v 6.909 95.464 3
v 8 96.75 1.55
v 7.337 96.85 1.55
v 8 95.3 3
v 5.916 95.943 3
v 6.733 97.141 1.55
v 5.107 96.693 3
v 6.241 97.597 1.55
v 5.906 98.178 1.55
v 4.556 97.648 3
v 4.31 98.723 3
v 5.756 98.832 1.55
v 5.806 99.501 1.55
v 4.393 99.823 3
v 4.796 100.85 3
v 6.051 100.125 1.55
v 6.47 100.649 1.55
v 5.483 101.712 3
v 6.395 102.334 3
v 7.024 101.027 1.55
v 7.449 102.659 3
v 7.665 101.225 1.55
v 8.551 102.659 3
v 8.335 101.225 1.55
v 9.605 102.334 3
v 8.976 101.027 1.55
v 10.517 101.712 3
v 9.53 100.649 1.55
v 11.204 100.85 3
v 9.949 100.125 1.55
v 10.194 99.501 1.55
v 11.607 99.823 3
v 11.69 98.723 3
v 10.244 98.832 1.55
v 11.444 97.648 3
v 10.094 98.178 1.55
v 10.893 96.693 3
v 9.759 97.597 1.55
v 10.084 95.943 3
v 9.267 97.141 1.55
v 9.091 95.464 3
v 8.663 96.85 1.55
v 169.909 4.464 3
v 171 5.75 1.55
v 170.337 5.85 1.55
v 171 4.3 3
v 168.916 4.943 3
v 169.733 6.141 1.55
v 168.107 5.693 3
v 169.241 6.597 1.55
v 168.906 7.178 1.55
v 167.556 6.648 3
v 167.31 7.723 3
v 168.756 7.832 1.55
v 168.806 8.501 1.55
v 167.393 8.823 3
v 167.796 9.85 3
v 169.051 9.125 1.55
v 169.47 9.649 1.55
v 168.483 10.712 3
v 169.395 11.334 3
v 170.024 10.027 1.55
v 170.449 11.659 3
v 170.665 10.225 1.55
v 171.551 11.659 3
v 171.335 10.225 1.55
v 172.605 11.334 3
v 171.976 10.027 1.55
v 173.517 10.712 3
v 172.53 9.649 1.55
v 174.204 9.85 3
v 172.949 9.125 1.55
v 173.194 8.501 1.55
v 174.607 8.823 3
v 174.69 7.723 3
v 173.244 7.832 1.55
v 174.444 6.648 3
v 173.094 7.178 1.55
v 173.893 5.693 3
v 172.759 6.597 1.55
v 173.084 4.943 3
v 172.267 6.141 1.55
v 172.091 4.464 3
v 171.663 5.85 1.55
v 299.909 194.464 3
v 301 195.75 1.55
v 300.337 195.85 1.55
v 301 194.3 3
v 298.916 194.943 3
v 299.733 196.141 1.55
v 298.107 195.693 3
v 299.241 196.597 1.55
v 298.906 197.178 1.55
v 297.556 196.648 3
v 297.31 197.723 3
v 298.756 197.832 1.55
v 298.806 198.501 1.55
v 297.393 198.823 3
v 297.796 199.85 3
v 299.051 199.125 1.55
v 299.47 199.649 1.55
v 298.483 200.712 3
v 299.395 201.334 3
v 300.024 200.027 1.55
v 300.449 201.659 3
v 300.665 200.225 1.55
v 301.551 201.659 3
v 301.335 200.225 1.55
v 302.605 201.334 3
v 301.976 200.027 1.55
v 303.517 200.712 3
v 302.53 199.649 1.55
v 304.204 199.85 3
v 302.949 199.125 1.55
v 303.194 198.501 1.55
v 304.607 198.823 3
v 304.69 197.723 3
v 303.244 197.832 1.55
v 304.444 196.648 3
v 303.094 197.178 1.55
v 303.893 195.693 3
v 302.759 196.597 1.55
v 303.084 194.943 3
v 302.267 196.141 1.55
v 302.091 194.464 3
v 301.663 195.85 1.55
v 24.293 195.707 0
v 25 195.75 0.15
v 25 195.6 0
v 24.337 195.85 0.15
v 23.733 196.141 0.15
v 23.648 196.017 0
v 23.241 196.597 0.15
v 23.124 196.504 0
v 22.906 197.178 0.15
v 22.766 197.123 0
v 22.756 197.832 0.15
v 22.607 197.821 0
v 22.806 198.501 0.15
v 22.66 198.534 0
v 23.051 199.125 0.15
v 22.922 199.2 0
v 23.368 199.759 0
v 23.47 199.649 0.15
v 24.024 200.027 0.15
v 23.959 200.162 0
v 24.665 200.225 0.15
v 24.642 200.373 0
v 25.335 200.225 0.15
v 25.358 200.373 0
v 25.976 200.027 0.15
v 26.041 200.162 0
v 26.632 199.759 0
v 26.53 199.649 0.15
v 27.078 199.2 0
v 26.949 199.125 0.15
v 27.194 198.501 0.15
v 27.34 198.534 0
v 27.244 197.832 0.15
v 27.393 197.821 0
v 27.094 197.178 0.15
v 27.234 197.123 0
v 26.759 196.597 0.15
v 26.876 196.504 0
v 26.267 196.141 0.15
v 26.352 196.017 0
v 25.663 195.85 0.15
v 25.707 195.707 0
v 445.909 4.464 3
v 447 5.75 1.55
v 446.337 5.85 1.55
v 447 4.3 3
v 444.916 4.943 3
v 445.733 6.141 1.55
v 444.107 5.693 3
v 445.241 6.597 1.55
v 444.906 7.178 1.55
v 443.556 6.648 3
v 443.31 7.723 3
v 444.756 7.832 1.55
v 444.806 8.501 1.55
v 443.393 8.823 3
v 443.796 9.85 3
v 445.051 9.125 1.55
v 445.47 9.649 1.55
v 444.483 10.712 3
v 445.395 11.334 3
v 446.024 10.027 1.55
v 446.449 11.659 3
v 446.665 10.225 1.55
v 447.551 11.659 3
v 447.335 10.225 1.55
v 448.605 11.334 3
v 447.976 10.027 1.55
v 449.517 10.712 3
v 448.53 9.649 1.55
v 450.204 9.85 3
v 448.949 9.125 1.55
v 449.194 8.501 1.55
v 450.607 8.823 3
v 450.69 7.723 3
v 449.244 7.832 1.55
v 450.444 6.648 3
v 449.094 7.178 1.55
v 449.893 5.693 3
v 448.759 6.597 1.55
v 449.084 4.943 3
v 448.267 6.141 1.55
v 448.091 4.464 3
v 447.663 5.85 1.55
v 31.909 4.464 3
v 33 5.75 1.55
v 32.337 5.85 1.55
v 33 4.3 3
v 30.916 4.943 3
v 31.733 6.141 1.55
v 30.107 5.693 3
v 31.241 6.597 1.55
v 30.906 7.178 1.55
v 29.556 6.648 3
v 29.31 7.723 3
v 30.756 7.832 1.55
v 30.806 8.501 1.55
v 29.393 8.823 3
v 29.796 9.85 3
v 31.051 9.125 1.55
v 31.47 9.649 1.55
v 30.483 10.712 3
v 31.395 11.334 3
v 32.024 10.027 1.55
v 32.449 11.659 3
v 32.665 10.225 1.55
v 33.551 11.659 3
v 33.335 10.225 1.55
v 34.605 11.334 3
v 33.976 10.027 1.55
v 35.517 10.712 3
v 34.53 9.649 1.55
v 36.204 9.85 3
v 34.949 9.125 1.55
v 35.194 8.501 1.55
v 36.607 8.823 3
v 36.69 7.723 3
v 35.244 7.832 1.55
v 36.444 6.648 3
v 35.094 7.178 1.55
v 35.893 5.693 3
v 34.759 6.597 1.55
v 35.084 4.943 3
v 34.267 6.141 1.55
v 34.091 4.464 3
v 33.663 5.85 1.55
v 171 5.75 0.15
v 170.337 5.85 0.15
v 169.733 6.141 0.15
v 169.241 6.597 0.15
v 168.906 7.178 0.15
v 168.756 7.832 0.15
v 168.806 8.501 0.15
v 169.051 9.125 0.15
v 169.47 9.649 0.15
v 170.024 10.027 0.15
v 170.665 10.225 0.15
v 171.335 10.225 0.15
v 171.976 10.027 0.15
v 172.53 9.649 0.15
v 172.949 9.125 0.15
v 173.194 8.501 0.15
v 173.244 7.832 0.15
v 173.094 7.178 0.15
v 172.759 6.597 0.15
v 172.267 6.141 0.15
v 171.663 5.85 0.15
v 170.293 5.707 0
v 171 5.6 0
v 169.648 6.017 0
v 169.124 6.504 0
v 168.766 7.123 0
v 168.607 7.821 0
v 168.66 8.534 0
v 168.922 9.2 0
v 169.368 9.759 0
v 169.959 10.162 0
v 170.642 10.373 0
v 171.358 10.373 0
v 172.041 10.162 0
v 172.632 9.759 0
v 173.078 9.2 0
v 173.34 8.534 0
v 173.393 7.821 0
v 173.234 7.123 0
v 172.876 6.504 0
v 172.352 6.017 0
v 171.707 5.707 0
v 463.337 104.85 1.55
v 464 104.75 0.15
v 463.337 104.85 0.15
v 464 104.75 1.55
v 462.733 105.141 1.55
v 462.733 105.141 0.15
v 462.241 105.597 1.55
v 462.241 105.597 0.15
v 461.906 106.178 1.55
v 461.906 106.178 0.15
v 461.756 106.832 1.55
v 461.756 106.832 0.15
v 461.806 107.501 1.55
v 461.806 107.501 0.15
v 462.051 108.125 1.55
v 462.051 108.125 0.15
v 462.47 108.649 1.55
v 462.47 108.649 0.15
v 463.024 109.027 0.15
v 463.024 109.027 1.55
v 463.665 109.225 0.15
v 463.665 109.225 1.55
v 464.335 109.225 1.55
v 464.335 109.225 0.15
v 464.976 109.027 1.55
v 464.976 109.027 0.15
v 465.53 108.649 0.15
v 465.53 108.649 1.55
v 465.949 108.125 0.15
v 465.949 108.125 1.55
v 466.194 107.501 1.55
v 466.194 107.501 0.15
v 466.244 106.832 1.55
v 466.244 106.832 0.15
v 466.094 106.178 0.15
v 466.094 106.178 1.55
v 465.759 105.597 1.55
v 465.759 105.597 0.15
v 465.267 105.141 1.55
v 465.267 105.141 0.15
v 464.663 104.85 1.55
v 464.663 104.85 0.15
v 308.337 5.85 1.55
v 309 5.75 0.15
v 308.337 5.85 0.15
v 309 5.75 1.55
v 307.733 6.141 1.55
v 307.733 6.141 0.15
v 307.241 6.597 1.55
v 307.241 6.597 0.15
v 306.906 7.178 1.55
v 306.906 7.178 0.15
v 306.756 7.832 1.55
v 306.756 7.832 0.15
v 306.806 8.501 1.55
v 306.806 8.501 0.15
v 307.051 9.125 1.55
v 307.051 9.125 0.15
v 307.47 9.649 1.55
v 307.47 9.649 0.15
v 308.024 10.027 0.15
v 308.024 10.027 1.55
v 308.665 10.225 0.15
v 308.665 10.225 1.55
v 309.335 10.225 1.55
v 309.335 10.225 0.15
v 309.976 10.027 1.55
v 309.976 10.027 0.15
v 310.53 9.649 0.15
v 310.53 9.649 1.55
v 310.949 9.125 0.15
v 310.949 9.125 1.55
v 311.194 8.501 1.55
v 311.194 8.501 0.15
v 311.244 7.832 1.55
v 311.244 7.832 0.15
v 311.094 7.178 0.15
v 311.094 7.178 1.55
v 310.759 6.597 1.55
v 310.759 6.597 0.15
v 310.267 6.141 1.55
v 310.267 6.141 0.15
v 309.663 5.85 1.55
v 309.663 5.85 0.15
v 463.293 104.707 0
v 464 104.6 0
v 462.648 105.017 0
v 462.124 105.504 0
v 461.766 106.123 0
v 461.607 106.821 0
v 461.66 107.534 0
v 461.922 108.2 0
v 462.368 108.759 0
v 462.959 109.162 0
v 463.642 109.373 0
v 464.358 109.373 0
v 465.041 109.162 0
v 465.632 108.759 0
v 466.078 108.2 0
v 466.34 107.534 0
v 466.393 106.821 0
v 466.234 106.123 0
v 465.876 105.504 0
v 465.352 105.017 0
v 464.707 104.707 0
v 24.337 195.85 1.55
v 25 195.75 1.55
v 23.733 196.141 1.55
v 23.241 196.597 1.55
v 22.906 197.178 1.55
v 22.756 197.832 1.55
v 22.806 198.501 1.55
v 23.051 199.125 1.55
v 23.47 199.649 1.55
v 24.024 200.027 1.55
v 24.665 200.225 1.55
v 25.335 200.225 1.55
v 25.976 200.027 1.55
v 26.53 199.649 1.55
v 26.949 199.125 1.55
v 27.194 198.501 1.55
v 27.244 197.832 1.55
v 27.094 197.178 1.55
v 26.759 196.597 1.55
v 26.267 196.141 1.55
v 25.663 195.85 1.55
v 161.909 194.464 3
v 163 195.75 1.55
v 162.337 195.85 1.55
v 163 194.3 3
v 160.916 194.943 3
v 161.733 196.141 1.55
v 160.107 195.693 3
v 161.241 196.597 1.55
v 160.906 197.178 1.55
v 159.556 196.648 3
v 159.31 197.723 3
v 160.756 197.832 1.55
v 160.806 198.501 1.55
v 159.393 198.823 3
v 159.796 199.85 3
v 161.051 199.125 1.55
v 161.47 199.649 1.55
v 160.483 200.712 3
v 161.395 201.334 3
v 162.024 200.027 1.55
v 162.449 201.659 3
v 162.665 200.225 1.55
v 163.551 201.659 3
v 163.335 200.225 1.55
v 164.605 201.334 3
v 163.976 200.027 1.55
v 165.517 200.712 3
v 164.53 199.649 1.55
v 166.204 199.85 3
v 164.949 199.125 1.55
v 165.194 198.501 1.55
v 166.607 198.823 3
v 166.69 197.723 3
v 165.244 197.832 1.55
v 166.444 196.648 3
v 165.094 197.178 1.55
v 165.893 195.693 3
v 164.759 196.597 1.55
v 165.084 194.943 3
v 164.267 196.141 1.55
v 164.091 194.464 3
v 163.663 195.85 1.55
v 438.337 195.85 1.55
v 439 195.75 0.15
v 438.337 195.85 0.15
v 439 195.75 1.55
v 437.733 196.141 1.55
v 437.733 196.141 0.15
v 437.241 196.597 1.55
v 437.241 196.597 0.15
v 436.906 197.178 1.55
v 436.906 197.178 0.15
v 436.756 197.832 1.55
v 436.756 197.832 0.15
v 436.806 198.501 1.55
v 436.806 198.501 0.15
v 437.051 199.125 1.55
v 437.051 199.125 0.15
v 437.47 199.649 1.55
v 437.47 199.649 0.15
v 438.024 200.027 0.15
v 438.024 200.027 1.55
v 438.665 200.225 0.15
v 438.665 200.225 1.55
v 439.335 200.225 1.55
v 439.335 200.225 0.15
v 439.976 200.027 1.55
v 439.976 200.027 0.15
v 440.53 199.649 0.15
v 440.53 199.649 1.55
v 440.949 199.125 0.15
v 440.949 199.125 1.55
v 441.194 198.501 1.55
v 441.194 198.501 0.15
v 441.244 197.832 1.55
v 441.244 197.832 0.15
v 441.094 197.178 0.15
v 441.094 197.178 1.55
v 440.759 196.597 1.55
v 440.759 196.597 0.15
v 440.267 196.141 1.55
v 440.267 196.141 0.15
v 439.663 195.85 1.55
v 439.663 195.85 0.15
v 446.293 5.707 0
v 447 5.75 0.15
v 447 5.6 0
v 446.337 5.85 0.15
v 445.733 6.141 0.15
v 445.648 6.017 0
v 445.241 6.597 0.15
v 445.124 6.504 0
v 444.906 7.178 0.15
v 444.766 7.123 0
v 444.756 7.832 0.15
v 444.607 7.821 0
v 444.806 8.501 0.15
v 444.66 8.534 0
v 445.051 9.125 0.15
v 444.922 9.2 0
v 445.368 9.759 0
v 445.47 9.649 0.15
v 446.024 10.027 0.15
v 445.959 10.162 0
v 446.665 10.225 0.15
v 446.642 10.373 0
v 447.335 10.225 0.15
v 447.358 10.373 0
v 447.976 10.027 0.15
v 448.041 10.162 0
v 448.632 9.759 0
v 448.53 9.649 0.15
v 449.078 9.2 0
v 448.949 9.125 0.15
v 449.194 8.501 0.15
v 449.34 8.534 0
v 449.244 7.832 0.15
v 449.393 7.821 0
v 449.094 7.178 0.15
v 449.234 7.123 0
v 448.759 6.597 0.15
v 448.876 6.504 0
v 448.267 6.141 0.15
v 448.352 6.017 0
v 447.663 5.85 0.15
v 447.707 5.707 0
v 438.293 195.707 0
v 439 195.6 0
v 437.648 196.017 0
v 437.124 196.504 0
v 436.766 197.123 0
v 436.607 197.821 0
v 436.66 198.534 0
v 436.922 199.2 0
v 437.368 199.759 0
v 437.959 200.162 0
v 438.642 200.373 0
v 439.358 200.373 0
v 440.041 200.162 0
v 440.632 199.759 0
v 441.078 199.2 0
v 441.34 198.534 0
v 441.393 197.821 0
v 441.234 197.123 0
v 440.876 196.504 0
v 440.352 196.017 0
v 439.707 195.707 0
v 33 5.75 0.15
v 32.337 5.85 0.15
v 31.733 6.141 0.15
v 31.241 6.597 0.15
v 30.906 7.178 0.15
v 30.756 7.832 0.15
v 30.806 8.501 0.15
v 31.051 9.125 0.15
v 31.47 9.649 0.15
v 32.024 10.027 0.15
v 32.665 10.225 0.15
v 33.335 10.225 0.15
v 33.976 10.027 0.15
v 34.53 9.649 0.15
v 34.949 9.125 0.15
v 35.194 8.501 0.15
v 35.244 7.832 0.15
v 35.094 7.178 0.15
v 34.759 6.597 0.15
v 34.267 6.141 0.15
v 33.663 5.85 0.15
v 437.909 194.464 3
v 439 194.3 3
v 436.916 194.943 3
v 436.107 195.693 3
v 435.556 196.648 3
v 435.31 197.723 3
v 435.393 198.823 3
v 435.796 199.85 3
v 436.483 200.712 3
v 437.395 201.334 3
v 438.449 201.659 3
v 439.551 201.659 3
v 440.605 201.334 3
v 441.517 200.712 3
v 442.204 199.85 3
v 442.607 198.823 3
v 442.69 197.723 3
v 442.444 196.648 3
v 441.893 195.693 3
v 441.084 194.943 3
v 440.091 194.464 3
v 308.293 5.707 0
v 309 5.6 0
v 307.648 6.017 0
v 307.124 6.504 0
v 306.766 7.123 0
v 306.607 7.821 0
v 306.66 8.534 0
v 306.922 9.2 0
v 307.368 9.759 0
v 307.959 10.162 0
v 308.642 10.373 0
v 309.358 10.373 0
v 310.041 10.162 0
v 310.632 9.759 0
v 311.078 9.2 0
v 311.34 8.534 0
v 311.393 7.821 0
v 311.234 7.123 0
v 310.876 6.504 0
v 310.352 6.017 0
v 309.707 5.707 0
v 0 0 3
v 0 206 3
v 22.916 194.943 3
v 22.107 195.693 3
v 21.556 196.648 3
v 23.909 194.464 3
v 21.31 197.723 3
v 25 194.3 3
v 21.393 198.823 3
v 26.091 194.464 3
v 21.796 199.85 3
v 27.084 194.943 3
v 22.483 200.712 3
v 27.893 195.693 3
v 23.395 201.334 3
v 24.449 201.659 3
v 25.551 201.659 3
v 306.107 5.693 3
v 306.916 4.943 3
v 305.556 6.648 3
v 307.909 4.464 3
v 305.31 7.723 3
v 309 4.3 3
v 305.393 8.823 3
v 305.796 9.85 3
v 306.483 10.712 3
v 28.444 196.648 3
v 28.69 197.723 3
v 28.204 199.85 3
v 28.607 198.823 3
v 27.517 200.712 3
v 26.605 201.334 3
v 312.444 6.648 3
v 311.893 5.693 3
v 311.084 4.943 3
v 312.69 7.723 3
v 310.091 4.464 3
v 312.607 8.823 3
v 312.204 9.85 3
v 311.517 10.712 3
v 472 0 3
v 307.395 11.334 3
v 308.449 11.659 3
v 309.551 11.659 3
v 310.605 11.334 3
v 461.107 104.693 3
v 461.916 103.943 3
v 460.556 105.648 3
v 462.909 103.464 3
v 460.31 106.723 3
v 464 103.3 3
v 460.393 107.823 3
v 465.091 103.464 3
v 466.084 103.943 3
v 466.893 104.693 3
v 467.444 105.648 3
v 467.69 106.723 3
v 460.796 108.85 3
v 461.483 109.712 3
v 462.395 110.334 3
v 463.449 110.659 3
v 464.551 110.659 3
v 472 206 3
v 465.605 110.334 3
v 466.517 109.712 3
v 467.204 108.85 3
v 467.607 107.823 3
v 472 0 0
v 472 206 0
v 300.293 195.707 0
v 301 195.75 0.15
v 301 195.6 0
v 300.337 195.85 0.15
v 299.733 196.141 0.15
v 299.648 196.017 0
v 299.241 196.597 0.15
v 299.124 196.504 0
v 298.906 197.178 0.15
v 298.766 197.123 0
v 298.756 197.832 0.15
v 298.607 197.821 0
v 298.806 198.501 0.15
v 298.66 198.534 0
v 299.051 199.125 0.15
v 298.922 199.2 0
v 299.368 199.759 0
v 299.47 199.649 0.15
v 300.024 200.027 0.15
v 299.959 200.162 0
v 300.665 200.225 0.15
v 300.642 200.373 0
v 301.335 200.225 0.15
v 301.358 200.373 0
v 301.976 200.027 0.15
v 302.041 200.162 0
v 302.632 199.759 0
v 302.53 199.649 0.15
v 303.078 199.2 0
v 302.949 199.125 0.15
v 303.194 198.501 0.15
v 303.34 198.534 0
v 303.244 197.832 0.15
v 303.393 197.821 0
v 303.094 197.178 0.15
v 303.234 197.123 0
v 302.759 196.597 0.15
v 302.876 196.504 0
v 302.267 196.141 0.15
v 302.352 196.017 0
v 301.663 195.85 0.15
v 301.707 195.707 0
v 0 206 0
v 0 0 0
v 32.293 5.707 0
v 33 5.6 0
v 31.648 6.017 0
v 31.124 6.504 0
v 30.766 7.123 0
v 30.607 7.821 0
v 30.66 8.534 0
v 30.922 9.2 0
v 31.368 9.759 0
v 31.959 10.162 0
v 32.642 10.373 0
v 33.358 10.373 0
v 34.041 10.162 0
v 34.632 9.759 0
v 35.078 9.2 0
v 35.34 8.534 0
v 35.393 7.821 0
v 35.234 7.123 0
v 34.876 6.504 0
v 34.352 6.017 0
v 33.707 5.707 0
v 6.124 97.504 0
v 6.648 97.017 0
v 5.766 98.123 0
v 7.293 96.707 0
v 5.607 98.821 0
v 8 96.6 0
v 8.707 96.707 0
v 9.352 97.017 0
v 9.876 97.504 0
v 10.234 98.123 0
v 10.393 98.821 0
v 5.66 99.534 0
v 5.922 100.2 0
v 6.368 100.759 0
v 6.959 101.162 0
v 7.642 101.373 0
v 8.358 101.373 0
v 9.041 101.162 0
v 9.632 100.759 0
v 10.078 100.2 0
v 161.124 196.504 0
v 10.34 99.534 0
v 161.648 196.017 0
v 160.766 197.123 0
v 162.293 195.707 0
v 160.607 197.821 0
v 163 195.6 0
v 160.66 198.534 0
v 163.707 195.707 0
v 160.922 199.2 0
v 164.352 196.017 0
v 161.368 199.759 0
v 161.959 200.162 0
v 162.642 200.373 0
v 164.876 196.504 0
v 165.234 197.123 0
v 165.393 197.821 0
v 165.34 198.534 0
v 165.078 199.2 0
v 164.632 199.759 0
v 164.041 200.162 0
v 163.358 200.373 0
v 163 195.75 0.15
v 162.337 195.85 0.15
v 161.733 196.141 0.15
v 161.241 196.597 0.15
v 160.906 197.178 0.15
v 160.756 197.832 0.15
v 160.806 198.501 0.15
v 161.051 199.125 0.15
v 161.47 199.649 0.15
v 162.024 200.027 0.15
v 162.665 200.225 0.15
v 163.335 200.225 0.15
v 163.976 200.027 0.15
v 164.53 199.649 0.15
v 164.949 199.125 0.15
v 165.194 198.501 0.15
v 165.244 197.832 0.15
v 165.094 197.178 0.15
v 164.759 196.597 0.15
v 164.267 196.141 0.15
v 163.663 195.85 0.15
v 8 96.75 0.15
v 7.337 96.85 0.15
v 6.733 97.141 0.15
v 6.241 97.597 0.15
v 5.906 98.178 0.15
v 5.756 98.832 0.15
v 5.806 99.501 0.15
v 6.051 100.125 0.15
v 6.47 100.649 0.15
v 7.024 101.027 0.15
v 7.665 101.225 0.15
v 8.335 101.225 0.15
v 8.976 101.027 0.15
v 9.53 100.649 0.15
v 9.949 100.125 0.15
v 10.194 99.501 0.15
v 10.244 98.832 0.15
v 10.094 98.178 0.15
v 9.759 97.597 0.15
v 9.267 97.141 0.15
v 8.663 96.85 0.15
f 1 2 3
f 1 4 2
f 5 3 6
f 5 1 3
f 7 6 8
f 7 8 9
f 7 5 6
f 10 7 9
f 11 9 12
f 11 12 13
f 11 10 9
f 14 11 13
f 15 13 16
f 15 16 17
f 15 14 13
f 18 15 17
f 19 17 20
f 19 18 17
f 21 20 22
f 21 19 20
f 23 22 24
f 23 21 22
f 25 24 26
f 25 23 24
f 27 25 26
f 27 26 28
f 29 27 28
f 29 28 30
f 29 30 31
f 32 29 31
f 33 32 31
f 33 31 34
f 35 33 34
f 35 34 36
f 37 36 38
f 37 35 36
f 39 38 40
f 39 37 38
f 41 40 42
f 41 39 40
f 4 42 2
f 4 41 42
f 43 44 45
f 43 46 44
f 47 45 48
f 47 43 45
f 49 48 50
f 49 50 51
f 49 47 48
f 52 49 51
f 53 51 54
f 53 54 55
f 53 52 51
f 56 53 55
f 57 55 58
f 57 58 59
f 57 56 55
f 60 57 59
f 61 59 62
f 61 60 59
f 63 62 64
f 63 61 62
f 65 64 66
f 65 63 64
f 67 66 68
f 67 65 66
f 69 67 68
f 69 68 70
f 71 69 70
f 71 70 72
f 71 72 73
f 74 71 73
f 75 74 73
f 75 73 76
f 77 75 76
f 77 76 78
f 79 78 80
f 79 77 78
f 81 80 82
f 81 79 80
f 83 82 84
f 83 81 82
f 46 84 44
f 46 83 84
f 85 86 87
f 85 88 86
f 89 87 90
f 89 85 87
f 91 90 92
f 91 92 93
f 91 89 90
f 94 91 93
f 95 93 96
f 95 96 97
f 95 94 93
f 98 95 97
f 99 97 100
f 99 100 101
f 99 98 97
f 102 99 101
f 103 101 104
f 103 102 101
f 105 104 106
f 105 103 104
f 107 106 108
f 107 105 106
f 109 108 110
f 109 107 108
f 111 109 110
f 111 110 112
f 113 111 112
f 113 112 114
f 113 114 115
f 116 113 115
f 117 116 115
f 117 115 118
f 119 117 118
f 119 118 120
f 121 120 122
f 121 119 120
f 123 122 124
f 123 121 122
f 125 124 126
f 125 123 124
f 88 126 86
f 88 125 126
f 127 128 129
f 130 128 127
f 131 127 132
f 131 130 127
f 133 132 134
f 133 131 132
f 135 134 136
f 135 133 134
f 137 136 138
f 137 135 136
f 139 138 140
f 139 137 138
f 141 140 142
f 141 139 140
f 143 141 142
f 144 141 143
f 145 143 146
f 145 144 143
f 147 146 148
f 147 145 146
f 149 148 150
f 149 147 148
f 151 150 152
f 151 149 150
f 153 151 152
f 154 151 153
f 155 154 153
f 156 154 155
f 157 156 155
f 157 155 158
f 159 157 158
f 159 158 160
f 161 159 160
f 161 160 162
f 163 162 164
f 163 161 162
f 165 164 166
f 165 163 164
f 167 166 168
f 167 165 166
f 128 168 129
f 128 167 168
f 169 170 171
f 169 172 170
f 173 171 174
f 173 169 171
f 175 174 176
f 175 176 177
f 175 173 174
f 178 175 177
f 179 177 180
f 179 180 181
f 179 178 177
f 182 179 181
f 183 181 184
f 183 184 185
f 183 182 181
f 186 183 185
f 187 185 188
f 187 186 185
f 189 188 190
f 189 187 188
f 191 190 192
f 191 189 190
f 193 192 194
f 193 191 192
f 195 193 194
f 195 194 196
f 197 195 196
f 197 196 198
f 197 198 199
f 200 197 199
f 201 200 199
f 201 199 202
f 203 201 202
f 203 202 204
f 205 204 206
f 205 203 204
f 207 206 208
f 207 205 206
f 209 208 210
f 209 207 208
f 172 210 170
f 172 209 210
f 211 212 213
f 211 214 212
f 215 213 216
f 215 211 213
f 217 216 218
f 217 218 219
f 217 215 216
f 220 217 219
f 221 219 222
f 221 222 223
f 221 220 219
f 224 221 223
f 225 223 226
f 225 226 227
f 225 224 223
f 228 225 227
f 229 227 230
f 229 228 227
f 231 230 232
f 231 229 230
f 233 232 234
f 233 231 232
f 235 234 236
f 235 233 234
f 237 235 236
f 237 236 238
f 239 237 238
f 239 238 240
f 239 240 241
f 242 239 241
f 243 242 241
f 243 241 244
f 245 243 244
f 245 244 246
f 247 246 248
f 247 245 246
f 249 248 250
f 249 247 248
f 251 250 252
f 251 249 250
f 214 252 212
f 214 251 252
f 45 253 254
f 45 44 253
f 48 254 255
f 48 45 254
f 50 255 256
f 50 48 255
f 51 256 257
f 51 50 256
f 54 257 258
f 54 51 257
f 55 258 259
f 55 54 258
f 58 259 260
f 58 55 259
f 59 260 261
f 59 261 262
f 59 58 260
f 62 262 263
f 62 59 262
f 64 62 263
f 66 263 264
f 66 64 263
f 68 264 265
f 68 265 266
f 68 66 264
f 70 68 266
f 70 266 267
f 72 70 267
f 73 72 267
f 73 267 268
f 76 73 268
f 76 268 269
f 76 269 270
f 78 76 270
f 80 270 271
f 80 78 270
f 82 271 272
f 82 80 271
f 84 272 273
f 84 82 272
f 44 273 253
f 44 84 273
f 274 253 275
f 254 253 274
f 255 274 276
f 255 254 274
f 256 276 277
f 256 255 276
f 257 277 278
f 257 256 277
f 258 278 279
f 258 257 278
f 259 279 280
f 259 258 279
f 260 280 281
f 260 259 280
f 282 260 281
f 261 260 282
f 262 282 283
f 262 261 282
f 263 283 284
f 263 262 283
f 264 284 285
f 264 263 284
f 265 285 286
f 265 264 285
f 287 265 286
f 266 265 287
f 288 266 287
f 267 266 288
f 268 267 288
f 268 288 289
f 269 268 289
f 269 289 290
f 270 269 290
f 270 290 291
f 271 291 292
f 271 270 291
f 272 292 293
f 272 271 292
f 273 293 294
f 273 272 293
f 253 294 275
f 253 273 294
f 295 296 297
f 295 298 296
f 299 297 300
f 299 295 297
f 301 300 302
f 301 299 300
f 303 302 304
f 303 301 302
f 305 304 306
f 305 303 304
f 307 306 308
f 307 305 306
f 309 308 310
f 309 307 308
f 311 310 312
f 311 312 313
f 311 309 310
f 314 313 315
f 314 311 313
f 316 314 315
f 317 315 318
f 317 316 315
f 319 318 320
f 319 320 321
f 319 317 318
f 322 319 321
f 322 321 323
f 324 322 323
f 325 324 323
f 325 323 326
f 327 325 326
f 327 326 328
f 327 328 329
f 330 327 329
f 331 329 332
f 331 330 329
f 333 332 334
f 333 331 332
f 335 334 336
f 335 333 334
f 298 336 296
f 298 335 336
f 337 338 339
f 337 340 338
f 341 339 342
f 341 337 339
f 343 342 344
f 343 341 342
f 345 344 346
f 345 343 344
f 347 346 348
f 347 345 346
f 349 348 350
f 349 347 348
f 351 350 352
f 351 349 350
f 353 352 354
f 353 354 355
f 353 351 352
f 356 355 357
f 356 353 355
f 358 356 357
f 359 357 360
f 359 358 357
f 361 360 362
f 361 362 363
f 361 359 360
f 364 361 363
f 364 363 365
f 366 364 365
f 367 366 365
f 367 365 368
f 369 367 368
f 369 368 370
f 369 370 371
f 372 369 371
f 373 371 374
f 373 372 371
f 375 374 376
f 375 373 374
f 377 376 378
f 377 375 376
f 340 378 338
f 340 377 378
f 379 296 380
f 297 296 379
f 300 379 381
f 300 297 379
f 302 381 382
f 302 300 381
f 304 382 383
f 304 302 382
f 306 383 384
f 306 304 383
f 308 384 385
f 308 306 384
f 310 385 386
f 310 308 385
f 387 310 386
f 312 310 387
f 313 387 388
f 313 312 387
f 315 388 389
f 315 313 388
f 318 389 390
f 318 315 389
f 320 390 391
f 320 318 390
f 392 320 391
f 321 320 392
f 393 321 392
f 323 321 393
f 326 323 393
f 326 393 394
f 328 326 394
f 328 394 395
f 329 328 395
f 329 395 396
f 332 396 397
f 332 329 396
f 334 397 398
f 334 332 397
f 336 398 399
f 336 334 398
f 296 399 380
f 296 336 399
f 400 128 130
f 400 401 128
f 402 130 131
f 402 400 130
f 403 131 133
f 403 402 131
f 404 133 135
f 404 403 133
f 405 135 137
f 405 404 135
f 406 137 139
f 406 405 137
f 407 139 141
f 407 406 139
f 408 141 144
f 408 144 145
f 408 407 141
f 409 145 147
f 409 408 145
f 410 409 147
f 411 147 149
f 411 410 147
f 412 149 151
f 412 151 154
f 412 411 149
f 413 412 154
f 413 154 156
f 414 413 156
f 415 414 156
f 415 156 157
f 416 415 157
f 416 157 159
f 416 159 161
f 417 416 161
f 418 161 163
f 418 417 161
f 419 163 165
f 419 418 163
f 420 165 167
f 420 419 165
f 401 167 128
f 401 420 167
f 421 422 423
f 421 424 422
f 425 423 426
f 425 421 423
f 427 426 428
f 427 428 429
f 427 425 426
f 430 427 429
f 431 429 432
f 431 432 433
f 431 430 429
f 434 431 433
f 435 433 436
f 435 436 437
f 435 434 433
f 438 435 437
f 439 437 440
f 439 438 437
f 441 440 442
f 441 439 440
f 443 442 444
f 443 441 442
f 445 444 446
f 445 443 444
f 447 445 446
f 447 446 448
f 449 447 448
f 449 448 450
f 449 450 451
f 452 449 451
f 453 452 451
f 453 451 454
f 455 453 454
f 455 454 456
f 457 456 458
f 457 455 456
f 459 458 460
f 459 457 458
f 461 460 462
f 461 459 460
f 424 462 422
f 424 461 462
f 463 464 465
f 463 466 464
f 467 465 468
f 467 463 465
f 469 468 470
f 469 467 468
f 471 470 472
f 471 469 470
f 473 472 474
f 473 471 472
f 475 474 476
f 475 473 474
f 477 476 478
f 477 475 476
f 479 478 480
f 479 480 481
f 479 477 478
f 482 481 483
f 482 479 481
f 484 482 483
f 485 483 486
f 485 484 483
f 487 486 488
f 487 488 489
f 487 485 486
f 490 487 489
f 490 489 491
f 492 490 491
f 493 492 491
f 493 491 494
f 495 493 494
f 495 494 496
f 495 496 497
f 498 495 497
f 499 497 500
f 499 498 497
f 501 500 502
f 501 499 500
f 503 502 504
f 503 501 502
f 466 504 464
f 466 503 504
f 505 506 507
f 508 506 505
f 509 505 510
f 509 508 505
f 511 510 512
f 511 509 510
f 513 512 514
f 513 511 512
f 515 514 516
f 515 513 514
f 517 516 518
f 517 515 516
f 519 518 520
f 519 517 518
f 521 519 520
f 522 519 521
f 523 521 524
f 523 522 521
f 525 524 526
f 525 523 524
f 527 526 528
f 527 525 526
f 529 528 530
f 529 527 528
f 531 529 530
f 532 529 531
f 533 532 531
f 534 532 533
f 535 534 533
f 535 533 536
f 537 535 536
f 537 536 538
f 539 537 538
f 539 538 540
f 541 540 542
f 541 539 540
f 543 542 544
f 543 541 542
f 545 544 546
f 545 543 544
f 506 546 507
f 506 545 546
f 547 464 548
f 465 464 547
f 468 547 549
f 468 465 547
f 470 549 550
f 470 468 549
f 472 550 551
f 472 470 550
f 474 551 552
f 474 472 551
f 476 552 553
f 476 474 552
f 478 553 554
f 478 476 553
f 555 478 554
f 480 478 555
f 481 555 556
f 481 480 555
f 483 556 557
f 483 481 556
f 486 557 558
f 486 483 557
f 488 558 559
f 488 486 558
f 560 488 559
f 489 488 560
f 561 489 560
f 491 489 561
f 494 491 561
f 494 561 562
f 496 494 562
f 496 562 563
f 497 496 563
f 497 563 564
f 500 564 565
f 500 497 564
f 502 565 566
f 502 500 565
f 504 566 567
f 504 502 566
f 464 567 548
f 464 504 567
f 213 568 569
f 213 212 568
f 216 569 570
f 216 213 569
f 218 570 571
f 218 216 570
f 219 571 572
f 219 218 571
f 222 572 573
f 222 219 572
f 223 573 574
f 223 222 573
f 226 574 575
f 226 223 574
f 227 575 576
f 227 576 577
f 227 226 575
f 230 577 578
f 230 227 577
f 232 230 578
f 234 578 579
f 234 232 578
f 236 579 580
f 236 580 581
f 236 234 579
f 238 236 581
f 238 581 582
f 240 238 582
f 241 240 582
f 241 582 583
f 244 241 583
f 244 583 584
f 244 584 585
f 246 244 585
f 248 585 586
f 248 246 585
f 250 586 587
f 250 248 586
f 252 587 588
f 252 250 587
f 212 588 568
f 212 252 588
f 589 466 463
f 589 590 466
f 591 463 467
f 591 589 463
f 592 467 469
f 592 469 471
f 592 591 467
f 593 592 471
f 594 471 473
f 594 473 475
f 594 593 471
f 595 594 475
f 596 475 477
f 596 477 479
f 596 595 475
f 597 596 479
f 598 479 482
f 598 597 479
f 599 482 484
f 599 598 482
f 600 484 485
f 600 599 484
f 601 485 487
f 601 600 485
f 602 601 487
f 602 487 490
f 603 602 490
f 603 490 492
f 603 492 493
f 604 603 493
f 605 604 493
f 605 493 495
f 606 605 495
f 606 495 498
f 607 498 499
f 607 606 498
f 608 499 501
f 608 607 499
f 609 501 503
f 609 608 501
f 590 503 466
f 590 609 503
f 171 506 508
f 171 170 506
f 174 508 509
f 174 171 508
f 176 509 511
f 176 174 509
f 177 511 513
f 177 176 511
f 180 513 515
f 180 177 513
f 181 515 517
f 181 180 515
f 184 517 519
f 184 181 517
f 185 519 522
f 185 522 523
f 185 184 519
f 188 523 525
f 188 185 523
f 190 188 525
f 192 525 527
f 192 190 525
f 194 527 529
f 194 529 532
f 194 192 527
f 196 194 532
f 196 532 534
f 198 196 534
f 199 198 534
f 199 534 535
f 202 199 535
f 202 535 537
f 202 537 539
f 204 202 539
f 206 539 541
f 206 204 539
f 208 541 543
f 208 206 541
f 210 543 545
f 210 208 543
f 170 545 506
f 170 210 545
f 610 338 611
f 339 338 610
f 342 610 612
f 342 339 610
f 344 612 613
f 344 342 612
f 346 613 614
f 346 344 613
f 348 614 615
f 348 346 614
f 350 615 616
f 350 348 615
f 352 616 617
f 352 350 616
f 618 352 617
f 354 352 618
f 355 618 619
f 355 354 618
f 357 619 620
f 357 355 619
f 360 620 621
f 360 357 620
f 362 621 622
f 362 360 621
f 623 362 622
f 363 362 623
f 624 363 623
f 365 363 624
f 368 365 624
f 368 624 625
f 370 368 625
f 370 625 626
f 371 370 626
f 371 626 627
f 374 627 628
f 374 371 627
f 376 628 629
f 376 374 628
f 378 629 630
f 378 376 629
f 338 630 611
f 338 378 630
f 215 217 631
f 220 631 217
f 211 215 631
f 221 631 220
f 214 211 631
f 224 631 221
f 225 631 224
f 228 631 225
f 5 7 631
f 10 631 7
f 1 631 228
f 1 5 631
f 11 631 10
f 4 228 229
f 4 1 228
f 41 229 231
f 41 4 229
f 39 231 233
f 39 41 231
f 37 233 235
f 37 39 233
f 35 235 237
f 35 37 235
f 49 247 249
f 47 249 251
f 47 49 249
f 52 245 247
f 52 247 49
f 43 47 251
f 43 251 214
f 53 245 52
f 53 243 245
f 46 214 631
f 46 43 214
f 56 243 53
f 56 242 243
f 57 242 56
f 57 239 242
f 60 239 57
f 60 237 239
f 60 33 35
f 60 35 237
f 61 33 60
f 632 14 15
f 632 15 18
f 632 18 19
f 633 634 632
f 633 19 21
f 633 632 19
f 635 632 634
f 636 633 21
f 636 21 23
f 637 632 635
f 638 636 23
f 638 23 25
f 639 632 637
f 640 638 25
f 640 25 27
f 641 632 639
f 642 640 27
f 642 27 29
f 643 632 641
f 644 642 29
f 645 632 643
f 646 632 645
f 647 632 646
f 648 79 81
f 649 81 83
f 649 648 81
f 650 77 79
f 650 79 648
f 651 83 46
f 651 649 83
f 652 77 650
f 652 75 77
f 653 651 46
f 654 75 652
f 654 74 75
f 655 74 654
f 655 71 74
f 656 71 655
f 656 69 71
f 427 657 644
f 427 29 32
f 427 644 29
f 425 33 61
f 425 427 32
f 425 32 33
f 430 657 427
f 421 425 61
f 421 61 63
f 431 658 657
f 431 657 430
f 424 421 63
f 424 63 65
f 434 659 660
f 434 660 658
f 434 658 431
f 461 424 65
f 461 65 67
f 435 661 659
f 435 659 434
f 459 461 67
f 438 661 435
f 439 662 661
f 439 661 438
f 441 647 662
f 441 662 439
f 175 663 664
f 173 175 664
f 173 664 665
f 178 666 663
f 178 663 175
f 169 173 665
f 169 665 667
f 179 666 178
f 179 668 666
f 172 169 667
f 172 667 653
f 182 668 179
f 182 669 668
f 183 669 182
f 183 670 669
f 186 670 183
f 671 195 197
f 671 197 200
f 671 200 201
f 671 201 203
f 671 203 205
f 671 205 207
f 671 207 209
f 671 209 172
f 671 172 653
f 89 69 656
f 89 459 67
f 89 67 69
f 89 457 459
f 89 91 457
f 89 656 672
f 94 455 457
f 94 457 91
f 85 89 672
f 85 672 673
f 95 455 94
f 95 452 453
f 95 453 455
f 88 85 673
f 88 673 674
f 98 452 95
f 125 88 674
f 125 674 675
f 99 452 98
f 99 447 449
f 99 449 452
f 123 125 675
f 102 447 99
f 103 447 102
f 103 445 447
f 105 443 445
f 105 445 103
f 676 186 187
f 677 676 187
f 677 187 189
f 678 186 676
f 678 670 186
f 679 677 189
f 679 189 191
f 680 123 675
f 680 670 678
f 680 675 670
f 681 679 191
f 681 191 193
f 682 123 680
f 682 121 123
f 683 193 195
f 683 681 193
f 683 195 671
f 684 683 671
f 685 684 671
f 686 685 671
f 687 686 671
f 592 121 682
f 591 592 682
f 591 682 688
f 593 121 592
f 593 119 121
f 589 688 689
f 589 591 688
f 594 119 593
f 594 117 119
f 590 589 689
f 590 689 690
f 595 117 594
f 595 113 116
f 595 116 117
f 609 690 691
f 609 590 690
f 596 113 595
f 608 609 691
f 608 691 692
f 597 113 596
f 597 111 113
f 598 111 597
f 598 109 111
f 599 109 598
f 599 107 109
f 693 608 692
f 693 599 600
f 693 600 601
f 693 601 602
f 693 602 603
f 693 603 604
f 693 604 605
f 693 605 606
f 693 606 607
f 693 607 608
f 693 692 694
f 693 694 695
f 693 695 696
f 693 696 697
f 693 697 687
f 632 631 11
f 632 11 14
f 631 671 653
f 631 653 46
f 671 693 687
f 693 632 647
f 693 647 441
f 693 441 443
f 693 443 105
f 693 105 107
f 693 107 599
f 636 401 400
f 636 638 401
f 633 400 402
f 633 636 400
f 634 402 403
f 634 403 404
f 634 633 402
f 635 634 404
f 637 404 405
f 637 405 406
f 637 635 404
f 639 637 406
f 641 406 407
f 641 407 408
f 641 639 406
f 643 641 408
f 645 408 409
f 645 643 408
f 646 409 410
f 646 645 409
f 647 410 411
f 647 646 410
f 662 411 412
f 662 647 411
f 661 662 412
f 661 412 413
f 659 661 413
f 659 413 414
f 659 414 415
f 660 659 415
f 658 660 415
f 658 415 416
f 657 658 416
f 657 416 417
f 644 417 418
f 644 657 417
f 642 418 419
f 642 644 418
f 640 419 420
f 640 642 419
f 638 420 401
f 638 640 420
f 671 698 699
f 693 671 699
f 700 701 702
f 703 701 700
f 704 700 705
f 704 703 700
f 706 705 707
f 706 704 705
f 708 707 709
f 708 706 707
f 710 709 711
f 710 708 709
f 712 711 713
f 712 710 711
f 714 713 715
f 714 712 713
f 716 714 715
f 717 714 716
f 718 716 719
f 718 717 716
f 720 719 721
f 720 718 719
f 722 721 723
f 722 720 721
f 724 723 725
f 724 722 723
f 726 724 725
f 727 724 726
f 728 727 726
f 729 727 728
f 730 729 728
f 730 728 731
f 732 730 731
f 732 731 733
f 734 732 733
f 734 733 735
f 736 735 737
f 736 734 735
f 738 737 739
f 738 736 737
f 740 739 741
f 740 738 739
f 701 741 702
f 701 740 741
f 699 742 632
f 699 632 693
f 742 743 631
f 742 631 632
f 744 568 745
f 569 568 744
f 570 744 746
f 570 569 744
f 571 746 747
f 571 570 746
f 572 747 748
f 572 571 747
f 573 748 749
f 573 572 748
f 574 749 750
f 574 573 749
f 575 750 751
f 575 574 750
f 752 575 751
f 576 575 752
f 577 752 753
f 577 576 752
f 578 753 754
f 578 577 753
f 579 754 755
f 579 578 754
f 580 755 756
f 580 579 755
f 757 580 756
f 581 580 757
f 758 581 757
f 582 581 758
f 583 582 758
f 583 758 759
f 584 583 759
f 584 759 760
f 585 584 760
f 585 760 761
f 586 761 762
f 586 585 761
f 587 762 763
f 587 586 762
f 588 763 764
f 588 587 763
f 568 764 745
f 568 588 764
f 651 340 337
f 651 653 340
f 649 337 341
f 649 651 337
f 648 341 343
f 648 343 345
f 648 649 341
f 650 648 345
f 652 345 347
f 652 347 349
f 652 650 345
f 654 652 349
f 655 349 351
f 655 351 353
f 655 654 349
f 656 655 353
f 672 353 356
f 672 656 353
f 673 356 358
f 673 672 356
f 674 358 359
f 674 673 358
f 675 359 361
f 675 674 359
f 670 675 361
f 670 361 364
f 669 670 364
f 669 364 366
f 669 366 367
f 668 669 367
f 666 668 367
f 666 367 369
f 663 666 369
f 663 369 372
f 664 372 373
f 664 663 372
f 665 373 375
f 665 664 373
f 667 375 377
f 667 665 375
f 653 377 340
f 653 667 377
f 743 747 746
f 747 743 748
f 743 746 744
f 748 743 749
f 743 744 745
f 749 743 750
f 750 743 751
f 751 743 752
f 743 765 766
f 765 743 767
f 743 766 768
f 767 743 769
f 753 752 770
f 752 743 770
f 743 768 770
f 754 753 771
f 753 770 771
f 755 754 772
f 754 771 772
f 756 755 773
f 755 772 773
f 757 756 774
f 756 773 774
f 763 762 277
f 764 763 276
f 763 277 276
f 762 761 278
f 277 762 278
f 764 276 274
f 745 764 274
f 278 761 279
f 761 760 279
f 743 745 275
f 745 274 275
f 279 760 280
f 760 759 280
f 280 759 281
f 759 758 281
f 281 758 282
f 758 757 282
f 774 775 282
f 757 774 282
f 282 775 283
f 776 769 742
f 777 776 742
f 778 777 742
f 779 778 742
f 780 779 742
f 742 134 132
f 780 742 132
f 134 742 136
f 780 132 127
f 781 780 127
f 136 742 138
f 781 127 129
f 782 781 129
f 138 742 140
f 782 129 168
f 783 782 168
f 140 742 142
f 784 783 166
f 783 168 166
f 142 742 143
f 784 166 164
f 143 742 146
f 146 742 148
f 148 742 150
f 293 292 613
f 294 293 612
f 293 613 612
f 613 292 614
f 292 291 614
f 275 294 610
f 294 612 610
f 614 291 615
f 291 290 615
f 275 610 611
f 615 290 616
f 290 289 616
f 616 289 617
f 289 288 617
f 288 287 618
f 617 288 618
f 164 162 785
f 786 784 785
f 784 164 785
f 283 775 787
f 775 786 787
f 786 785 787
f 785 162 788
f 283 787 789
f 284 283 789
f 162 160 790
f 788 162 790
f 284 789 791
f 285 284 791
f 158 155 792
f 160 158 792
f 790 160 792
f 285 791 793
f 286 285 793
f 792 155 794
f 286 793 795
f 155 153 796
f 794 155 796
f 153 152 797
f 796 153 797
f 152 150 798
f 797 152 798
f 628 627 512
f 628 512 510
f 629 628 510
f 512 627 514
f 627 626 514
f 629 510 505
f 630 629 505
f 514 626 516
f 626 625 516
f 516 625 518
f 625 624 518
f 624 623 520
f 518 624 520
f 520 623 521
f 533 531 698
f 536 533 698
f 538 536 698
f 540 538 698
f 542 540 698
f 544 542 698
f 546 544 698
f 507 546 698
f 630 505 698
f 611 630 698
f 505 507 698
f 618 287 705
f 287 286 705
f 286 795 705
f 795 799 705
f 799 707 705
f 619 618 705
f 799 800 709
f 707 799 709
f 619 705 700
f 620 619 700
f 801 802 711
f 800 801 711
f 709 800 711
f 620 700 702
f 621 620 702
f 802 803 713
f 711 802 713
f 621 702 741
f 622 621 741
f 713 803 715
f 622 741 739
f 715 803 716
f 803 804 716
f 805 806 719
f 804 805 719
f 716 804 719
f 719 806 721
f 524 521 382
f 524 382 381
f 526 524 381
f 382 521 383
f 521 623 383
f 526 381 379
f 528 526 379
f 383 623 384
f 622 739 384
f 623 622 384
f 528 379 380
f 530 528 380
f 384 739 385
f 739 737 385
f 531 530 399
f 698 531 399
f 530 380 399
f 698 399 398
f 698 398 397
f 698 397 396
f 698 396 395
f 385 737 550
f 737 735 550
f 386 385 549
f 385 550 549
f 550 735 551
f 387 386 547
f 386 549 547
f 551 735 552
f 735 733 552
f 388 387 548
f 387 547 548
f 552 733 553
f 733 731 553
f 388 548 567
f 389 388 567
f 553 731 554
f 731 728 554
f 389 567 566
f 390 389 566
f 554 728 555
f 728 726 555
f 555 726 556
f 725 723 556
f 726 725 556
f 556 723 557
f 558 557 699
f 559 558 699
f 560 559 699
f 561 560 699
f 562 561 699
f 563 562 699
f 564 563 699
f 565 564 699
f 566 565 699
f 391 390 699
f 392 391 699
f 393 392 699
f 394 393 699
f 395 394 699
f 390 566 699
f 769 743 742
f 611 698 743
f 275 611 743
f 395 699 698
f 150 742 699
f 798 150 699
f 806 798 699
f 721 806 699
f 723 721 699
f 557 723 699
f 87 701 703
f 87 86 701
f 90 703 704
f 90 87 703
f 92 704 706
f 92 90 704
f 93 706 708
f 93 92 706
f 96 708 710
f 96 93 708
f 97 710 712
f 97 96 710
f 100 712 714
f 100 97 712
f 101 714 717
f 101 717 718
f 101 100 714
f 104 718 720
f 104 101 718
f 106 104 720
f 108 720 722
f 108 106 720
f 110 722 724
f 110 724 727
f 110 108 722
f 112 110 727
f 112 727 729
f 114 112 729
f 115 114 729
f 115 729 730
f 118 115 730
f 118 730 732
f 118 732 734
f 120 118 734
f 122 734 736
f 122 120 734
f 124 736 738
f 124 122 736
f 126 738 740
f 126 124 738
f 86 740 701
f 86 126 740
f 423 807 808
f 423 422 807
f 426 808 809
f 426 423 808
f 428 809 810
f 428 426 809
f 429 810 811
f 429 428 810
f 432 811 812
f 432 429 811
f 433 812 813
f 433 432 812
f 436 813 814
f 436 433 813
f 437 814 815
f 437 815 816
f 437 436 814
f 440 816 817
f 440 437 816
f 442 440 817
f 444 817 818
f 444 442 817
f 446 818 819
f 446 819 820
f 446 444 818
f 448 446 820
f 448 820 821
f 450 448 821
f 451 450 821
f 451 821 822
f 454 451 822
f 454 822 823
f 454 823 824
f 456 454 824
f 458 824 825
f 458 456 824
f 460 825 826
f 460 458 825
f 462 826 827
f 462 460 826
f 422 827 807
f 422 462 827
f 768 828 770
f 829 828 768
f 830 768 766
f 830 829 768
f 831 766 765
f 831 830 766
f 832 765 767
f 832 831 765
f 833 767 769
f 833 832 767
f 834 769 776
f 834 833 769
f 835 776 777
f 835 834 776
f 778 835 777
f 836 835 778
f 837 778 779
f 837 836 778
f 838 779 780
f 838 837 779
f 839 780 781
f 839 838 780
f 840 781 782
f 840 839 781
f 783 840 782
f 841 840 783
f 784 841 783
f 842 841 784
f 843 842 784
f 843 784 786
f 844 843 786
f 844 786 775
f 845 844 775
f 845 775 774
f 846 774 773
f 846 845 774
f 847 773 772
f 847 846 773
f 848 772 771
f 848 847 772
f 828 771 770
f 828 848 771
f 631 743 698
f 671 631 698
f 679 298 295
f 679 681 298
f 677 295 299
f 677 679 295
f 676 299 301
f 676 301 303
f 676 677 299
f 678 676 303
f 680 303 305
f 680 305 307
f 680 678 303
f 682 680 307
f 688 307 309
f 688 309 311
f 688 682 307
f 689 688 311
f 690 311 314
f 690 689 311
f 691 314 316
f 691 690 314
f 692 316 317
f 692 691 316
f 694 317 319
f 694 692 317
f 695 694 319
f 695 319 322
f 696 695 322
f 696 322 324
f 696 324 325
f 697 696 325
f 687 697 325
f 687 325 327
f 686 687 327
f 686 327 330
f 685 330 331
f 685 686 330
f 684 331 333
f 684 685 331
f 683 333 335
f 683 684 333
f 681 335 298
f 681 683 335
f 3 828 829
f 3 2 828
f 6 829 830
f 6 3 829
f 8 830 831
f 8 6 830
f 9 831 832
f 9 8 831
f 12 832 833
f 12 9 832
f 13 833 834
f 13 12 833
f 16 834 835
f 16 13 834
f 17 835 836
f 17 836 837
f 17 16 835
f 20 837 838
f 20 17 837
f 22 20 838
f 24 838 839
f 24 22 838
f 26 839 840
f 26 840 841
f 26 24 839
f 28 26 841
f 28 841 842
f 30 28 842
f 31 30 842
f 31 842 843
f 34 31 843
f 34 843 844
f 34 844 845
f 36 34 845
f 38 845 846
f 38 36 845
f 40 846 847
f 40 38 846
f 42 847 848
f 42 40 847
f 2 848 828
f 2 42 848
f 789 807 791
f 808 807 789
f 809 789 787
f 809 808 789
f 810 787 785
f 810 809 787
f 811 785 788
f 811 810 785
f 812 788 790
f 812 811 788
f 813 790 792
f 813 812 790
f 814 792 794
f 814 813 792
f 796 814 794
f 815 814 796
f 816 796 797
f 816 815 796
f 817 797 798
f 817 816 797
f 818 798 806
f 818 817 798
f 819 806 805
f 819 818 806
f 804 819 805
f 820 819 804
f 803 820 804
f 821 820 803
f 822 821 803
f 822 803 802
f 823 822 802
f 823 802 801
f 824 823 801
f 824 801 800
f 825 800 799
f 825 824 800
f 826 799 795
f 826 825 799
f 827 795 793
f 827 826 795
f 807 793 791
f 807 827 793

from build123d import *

# Parameters (mm, degrees)
SKETCH_1_W                  = 472
SKETCH_1_H                  = 206
EXTRUDE_1_DEPTH             = 3
HOLE_WIZARD_M41_AT_2_COUNT  = 2
HOLE_WIZARD_M41_AT_2_PITCH  = 138
HOLE_WIZARD_M41_AT_3_COUNT  = 2
HOLE_WIZARD_M41_AT_3_PITCH  = 276
HOLE_WIZARD_M41_AT_4_COUNT  = 2
HOLE_WIZARD_M41_AT_4_PITCH  = 414
HOLE_WIZARD_M41_AT_5_COUNT  = 2
HOLE_WIZARD_M41_AT_5_PITCH  = 462.800172861
HOLE_WIZARD_M41_AT_6_COUNT  = 2
HOLE_WIZARD_M41_AT_6_PITCH  = 341.695771118
HOLE_WIZARD_M41_AT_7_COUNT  = 2
HOLE_WIZARD_M41_AT_7_PITCH  = 239.616360042
HOLE_WIZARD_M41_AT_8_COUNT  = 2
HOLE_WIZARD_M41_AT_8_PITCH  = 190.168346472
HOLE_WIZARD_M41_AT_9_COUNT  = 2
HOLE_WIZARD_M41_AT_9_PITCH  = 100.448992031
HOLE_WIZARD_M41_AT_10_COUNT = 2
HOLE_WIZARD_M41_AT_10_PITCH = 448.332465922


with BuildPart() as part:
    # Эскиз1 → Бобышка-Вытянуть1 (new body)
    with BuildSketch(Plane.XY):
        with Locations((236, 103)):
            Rectangle(SKETCH_1_W, SKETCH_1_H)
    extrude(amount=EXTRUDE_1_DEPTH)

    # Эскиз2 → Зенковка для винта с потайной головкой M41 (revolve, cut)
    with BuildSketch(Plane(origin=(25, 198, 3), x_dir=(0, -1, 0), z_dir=(1, 0, 0))):
        Polygon((0, 0), (0, 3), (2.4, 3), (2.25, 2.85), (2.25, 1.45), (3.7, 0), align=None)
    hole_wizard_m41 = revolve(axis=Axis((25, 198, 9.35), (0, 0, -1)), mode=Mode.SUBTRACT)

    # Зенковка для винта с потайной головкой M41 at 2: Зенковка для винта с потайной головкой M41 ×2
    with Locations(*[(i * HOLE_WIZARD_M41_AT_2_PITCH, 0, 0) for i in range(1, HOLE_WIZARD_M41_AT_2_COUNT)]):
        add(hole_wizard_m41, mode=Mode.SUBTRACT)

    # Зенковка для винта с потайной головкой M41 at 3: Зенковка для винта с потайной головкой M41 ×2
    with Locations(*[(i * HOLE_WIZARD_M41_AT_3_PITCH, 0, 0) for i in range(1, HOLE_WIZARD_M41_AT_3_COUNT)]):
        add(hole_wizard_m41, mode=Mode.SUBTRACT)

    # Зенковка для винта с потайной головкой M41 at 4: Зенковка для винта с потайной головкой M41 ×2
    with Locations(*[(i * HOLE_WIZARD_M41_AT_4_PITCH, 0, 0) for i in range(1, HOLE_WIZARD_M41_AT_4_COUNT)]):
        add(hole_wizard_m41, mode=Mode.SUBTRACT)

    # Зенковка для винта с потайной головкой M41 at 5: Зенковка для винта с потайной головкой M41 ×2
    with Locations(*[Vector(0.911840627, -0.410544358, 0) * (i * HOLE_WIZARD_M41_AT_5_PITCH) for i in range(1, HOLE_WIZARD_M41_AT_5_COUNT)]):
        add(hole_wizard_m41, mode=Mode.SUBTRACT)

    # Зенковка для винта с потайной головкой M41 at 6: Зенковка для винта с потайной головкой M41 ×2
    with Locations(*[Vector(0.831148712, -0.556050195, 0) * (i * HOLE_WIZARD_M41_AT_6_PITCH) for i in range(1, HOLE_WIZARD_M41_AT_6_COUNT)]):
        add(hole_wizard_m41, mode=Mode.SUBTRACT)

    # Зенковка для винта с потайной головкой M41 at 7: Зенковка для винта с потайной головкой M41 ×2
    with Locations(*[Vector(0.609307311, -0.792934172, 0) * (i * HOLE_WIZARD_M41_AT_7_PITCH) for i in range(1, HOLE_WIZARD_M41_AT_7_COUNT)]):
        add(hole_wizard_m41, mode=Mode.SUBTRACT)

    # Зенковка для винта с потайной головкой M41 at 8: Зенковка для винта с потайной головкой M41 ×2
    with Locations(*[Vector(0.042067989, -0.99911475, 0) * (i * HOLE_WIZARD_M41_AT_8_PITCH) for i in range(1, HOLE_WIZARD_M41_AT_8_COUNT)]):
        add(hole_wizard_m41, mode=Mode.SUBTRACT)

    # Зенковка для винта с потайной головкой M41 at 9: Зенковка для винта с потайной головкой M41 ×2
    with Locations(*[Vector(-0.169240125, -0.985574847, 0) * (i * HOLE_WIZARD_M41_AT_9_PITCH) for i in range(1, HOLE_WIZARD_M41_AT_9_COUNT)]):
        add(hole_wizard_m41, mode=Mode.SUBTRACT)

    # Зенковка для винта с потайной головкой M41 at 10: Зенковка для винта с потайной головкой M41 ×2
    with Locations(*[Vector(0.979184051, -0.20297437, 0) * (i * HOLE_WIZARD_M41_AT_10_PITCH) for i in range(1, HOLE_WIZARD_M41_AT_10_COUNT)]):
        add(hole_wizard_m41, mode=Mode.SUBTRACT)


solid = part.part
